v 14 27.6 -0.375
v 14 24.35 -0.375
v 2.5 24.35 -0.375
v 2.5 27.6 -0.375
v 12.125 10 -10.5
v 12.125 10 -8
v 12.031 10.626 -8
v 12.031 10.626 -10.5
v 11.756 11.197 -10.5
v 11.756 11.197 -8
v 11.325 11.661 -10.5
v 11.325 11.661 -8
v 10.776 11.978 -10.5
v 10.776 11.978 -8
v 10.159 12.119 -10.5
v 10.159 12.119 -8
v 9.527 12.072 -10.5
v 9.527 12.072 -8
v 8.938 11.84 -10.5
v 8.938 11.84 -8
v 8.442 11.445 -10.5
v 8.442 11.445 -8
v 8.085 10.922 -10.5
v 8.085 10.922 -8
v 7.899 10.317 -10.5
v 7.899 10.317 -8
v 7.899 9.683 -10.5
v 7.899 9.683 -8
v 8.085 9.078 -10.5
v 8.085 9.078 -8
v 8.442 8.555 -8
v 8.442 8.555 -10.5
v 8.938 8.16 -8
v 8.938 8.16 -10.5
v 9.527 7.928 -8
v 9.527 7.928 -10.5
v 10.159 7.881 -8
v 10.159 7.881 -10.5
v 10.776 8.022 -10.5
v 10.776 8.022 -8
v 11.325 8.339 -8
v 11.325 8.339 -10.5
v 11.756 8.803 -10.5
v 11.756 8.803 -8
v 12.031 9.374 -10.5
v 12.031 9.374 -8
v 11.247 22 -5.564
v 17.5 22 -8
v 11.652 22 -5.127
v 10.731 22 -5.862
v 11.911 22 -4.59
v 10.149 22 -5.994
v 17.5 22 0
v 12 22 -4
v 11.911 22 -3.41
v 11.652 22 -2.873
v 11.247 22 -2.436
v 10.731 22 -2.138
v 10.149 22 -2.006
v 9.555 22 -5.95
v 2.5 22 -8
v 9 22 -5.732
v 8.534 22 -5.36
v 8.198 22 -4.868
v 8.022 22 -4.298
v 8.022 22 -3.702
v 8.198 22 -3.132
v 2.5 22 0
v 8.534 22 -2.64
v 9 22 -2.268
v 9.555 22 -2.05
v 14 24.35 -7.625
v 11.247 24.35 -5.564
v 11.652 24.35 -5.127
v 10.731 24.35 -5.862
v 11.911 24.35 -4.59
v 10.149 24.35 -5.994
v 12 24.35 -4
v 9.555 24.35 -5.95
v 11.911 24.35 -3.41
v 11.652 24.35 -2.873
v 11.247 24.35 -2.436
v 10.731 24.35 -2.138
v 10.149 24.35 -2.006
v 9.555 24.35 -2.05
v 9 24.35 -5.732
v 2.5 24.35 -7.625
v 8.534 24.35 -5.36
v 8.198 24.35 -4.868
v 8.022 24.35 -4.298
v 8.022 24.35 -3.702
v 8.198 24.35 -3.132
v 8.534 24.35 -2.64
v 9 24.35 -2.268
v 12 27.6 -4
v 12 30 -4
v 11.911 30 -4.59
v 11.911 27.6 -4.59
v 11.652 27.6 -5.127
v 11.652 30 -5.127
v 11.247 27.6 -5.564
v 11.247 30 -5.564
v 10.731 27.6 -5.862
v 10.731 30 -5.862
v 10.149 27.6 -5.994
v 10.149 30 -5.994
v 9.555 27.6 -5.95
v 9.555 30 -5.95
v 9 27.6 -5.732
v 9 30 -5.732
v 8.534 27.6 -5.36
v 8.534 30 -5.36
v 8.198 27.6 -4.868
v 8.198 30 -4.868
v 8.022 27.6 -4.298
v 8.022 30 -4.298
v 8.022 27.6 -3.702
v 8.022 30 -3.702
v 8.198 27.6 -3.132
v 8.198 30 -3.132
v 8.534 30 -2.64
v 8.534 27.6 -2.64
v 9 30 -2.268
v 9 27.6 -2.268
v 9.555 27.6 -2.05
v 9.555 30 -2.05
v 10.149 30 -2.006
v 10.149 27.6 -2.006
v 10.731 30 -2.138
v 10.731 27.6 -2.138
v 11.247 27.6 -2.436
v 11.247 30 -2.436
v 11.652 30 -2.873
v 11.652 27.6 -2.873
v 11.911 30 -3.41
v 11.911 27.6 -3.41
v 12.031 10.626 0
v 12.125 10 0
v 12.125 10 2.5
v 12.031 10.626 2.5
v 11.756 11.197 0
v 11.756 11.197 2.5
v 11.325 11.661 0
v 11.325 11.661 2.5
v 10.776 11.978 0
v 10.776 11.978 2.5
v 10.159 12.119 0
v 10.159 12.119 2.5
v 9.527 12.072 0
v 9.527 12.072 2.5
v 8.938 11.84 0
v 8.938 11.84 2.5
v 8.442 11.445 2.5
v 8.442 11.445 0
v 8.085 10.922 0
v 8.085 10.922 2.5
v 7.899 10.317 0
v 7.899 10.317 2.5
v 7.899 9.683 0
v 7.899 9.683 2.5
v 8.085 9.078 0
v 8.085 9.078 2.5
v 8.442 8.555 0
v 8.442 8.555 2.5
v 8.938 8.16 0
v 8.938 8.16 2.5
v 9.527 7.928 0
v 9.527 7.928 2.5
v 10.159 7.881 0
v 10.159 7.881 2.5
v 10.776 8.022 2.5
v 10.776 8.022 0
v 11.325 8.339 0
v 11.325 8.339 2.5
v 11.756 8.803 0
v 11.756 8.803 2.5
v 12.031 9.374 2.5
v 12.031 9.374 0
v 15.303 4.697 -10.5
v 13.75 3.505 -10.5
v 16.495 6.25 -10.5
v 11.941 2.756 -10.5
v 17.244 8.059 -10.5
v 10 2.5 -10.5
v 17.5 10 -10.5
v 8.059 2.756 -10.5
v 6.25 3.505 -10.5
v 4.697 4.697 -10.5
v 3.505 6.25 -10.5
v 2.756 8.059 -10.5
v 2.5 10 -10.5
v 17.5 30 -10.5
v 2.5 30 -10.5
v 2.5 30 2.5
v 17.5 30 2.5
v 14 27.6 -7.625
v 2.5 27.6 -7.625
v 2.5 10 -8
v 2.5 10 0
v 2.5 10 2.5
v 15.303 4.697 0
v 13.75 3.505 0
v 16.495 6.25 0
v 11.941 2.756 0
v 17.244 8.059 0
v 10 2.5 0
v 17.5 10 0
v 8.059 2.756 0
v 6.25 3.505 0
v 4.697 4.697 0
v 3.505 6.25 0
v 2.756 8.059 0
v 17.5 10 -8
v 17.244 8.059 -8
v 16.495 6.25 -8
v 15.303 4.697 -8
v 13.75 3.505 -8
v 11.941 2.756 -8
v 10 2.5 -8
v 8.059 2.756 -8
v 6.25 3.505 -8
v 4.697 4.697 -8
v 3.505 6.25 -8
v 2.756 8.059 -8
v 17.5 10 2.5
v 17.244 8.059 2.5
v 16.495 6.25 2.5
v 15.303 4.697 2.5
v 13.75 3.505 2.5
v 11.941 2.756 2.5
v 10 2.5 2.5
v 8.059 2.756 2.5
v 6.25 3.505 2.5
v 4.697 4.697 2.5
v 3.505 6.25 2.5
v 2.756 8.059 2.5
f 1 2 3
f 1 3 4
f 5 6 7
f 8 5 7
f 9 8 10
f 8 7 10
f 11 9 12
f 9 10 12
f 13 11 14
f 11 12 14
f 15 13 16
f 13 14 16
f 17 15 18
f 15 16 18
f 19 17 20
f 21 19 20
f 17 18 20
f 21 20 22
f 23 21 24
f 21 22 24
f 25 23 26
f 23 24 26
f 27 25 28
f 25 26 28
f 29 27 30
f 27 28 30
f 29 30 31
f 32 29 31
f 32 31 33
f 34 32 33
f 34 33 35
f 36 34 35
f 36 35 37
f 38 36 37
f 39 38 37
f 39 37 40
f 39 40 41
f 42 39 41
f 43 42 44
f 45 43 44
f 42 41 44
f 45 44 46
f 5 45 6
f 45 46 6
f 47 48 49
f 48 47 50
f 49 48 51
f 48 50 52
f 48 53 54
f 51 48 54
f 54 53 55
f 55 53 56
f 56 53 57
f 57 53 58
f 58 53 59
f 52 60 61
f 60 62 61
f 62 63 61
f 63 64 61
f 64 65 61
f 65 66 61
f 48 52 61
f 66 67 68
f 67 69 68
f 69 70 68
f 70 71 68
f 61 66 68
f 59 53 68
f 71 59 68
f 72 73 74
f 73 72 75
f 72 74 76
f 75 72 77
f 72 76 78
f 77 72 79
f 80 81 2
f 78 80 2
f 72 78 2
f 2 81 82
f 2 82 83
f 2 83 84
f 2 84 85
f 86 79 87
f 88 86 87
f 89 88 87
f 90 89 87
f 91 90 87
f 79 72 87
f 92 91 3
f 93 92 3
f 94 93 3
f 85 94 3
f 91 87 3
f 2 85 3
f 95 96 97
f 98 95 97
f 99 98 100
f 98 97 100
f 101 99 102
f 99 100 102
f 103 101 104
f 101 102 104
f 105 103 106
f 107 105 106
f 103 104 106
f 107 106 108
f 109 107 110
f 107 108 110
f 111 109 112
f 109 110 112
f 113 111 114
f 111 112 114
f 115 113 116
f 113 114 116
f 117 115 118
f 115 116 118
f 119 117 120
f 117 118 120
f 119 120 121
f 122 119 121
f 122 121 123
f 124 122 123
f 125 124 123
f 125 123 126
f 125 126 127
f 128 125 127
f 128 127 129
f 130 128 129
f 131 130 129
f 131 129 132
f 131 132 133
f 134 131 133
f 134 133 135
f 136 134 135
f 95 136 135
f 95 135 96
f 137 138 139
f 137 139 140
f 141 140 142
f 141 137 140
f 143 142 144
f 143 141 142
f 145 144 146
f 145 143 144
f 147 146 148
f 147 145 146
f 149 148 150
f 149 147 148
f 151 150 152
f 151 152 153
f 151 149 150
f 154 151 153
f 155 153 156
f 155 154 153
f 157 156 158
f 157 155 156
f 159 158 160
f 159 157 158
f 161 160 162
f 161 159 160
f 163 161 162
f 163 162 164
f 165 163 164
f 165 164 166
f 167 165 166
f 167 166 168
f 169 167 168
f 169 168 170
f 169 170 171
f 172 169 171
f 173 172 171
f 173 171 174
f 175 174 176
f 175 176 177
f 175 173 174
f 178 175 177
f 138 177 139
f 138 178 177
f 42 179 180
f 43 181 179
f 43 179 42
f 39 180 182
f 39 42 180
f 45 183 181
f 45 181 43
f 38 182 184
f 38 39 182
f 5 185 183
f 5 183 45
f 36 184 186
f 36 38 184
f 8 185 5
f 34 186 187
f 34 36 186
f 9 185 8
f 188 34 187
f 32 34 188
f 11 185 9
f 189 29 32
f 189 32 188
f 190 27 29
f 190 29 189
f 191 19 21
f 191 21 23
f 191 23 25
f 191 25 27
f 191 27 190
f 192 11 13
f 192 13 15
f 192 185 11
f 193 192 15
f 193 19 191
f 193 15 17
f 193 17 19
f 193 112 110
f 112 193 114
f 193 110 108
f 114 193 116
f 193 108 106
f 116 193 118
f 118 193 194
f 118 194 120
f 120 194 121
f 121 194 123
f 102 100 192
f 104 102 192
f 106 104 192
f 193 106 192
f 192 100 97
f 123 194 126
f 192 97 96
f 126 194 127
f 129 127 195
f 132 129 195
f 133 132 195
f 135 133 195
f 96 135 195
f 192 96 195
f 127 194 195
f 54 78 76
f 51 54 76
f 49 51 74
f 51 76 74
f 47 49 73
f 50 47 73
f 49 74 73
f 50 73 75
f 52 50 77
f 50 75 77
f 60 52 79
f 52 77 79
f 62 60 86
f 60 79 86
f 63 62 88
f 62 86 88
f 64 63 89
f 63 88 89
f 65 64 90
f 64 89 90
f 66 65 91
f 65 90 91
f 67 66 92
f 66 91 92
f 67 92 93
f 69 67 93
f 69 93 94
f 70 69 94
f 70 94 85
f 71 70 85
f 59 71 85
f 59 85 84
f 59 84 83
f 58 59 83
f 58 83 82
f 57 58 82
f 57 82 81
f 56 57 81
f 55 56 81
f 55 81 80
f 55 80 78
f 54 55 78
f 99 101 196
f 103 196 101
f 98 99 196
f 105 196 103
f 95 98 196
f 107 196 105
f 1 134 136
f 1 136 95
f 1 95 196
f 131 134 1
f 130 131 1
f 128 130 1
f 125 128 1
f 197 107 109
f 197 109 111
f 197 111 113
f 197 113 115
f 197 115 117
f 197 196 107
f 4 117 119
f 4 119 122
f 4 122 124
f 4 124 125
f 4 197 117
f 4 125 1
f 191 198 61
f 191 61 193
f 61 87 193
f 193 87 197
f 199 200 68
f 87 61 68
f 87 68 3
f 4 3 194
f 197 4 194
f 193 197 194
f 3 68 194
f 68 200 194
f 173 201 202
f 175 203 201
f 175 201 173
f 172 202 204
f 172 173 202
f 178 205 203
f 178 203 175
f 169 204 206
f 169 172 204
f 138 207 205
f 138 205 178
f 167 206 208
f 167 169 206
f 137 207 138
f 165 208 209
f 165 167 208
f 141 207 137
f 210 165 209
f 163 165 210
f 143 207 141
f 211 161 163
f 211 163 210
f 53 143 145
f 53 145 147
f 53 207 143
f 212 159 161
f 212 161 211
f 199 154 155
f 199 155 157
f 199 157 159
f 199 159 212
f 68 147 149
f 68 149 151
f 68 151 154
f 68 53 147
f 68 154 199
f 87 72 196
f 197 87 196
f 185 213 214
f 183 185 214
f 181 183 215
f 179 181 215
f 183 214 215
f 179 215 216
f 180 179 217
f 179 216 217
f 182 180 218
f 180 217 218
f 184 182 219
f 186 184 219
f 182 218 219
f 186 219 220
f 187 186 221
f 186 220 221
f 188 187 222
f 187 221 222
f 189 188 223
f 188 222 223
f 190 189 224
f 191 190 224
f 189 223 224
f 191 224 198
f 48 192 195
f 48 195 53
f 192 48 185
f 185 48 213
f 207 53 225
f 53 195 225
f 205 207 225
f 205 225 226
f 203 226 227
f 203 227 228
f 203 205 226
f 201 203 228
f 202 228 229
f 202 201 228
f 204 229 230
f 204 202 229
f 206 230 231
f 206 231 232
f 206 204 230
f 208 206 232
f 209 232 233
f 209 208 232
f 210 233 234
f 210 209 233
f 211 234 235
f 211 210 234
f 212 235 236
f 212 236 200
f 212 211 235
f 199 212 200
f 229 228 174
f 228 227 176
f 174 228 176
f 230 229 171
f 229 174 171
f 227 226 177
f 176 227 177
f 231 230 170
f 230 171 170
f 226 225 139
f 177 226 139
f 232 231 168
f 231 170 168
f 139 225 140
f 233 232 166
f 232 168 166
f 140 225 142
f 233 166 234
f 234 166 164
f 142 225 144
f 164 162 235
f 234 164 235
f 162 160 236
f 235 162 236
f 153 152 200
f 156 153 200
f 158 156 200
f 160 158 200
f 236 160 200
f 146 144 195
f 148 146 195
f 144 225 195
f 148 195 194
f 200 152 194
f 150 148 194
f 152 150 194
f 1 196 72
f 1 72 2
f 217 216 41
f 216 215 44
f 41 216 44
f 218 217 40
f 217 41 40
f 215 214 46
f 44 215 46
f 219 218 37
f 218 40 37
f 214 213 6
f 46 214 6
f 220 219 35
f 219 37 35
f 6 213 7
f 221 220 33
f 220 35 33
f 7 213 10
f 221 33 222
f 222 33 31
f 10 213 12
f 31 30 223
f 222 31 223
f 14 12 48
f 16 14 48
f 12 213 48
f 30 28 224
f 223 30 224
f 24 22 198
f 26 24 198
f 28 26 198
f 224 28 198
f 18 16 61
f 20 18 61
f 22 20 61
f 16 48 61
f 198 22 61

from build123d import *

# Parameters (mm, degrees)
SKETCH1_R           = 2.125
BOSS_EXTRUDE1_DEPTH = 2.5
SKETCH2_W           = 15
SKETCH2_H           = 8
BOSS_EXTRUDE2_DEPTH = 8
CUT_EXTRUDE1_REACH  = 29.5
SKETCH4_R           = 2
SKETCH6_W           = 7.25
SKETCH6_H           = 3.25
CUT_EXTRUDE2_DEPTH  = 11.5


with BuildPart() as part:
    # Sketch1 → Boss-Extrude1 (new body)
    with BuildSketch(Plane.XY):
        with BuildLine():
            Line((2.5, 10), (2.5, 30))
            Line((2.5, 30), (17.5, 30))
            Line((17.5, 30), (17.5, 10))
            ThreePointArc((17.5, 10), (10, 2.5), (2.5, 10))
        make_face()
        with Locations((10, 10)):
            Circle(SKETCH1_R, mode=Mode.SUBTRACT)
    boss_extrude1 = extrude(amount=BOSS_EXTRUDE1_DEPTH)

    # Sketch2 → Boss-Extrude2 (add)
    with BuildSketch(Plane(origin=(0, 0, 0), x_dir=(-1, 0, 0), z_dir=(0, 0, -1))):
        with Locations((-10, 26)):
            Rectangle(SKETCH2_W, SKETCH2_H)
    extrude(amount=BOSS_EXTRUDE2_DEPTH)

    # Mirror1: Boss-Extrude1 across plane
    add(boss_extrude1.mirror(Plane.XY.offset(-4)))

    # Sketch4 → Cut-Extrude1 (cut, up to next)
    with BuildSketch(Plane(origin=(0, 30, 0), x_dir=(1, 0, 0), z_dir=(0, 1, 0)), mode=Mode.PRIVATE) as cut_extrude1_sk1:
        with Locations((10, 4)):
            Circle(SKETCH4_R)
    cut_extrude1_tool1 = extrude(cut_extrude1_sk1.sketch, amount=-CUT_EXTRUDE1_REACH, mode=Mode.PRIVATE) & part.part
    add(cut_extrude1_tool1.solids().sort_by_distance((10, 30, -4))[0], mode=Mode.SUBTRACT)

    # Sketch6 → Cut-Extrude2 (cut)
    with BuildSketch(Plane.ZY.offset(-2.5)):
        with Locations((-4, 25.975)):
            Rectangle(SKETCH6_W, SKETCH6_H)
    extrude(amount=-CUT_EXTRUDE2_DEPTH, mode=Mode.SUBTRACT)


solid = part.part
